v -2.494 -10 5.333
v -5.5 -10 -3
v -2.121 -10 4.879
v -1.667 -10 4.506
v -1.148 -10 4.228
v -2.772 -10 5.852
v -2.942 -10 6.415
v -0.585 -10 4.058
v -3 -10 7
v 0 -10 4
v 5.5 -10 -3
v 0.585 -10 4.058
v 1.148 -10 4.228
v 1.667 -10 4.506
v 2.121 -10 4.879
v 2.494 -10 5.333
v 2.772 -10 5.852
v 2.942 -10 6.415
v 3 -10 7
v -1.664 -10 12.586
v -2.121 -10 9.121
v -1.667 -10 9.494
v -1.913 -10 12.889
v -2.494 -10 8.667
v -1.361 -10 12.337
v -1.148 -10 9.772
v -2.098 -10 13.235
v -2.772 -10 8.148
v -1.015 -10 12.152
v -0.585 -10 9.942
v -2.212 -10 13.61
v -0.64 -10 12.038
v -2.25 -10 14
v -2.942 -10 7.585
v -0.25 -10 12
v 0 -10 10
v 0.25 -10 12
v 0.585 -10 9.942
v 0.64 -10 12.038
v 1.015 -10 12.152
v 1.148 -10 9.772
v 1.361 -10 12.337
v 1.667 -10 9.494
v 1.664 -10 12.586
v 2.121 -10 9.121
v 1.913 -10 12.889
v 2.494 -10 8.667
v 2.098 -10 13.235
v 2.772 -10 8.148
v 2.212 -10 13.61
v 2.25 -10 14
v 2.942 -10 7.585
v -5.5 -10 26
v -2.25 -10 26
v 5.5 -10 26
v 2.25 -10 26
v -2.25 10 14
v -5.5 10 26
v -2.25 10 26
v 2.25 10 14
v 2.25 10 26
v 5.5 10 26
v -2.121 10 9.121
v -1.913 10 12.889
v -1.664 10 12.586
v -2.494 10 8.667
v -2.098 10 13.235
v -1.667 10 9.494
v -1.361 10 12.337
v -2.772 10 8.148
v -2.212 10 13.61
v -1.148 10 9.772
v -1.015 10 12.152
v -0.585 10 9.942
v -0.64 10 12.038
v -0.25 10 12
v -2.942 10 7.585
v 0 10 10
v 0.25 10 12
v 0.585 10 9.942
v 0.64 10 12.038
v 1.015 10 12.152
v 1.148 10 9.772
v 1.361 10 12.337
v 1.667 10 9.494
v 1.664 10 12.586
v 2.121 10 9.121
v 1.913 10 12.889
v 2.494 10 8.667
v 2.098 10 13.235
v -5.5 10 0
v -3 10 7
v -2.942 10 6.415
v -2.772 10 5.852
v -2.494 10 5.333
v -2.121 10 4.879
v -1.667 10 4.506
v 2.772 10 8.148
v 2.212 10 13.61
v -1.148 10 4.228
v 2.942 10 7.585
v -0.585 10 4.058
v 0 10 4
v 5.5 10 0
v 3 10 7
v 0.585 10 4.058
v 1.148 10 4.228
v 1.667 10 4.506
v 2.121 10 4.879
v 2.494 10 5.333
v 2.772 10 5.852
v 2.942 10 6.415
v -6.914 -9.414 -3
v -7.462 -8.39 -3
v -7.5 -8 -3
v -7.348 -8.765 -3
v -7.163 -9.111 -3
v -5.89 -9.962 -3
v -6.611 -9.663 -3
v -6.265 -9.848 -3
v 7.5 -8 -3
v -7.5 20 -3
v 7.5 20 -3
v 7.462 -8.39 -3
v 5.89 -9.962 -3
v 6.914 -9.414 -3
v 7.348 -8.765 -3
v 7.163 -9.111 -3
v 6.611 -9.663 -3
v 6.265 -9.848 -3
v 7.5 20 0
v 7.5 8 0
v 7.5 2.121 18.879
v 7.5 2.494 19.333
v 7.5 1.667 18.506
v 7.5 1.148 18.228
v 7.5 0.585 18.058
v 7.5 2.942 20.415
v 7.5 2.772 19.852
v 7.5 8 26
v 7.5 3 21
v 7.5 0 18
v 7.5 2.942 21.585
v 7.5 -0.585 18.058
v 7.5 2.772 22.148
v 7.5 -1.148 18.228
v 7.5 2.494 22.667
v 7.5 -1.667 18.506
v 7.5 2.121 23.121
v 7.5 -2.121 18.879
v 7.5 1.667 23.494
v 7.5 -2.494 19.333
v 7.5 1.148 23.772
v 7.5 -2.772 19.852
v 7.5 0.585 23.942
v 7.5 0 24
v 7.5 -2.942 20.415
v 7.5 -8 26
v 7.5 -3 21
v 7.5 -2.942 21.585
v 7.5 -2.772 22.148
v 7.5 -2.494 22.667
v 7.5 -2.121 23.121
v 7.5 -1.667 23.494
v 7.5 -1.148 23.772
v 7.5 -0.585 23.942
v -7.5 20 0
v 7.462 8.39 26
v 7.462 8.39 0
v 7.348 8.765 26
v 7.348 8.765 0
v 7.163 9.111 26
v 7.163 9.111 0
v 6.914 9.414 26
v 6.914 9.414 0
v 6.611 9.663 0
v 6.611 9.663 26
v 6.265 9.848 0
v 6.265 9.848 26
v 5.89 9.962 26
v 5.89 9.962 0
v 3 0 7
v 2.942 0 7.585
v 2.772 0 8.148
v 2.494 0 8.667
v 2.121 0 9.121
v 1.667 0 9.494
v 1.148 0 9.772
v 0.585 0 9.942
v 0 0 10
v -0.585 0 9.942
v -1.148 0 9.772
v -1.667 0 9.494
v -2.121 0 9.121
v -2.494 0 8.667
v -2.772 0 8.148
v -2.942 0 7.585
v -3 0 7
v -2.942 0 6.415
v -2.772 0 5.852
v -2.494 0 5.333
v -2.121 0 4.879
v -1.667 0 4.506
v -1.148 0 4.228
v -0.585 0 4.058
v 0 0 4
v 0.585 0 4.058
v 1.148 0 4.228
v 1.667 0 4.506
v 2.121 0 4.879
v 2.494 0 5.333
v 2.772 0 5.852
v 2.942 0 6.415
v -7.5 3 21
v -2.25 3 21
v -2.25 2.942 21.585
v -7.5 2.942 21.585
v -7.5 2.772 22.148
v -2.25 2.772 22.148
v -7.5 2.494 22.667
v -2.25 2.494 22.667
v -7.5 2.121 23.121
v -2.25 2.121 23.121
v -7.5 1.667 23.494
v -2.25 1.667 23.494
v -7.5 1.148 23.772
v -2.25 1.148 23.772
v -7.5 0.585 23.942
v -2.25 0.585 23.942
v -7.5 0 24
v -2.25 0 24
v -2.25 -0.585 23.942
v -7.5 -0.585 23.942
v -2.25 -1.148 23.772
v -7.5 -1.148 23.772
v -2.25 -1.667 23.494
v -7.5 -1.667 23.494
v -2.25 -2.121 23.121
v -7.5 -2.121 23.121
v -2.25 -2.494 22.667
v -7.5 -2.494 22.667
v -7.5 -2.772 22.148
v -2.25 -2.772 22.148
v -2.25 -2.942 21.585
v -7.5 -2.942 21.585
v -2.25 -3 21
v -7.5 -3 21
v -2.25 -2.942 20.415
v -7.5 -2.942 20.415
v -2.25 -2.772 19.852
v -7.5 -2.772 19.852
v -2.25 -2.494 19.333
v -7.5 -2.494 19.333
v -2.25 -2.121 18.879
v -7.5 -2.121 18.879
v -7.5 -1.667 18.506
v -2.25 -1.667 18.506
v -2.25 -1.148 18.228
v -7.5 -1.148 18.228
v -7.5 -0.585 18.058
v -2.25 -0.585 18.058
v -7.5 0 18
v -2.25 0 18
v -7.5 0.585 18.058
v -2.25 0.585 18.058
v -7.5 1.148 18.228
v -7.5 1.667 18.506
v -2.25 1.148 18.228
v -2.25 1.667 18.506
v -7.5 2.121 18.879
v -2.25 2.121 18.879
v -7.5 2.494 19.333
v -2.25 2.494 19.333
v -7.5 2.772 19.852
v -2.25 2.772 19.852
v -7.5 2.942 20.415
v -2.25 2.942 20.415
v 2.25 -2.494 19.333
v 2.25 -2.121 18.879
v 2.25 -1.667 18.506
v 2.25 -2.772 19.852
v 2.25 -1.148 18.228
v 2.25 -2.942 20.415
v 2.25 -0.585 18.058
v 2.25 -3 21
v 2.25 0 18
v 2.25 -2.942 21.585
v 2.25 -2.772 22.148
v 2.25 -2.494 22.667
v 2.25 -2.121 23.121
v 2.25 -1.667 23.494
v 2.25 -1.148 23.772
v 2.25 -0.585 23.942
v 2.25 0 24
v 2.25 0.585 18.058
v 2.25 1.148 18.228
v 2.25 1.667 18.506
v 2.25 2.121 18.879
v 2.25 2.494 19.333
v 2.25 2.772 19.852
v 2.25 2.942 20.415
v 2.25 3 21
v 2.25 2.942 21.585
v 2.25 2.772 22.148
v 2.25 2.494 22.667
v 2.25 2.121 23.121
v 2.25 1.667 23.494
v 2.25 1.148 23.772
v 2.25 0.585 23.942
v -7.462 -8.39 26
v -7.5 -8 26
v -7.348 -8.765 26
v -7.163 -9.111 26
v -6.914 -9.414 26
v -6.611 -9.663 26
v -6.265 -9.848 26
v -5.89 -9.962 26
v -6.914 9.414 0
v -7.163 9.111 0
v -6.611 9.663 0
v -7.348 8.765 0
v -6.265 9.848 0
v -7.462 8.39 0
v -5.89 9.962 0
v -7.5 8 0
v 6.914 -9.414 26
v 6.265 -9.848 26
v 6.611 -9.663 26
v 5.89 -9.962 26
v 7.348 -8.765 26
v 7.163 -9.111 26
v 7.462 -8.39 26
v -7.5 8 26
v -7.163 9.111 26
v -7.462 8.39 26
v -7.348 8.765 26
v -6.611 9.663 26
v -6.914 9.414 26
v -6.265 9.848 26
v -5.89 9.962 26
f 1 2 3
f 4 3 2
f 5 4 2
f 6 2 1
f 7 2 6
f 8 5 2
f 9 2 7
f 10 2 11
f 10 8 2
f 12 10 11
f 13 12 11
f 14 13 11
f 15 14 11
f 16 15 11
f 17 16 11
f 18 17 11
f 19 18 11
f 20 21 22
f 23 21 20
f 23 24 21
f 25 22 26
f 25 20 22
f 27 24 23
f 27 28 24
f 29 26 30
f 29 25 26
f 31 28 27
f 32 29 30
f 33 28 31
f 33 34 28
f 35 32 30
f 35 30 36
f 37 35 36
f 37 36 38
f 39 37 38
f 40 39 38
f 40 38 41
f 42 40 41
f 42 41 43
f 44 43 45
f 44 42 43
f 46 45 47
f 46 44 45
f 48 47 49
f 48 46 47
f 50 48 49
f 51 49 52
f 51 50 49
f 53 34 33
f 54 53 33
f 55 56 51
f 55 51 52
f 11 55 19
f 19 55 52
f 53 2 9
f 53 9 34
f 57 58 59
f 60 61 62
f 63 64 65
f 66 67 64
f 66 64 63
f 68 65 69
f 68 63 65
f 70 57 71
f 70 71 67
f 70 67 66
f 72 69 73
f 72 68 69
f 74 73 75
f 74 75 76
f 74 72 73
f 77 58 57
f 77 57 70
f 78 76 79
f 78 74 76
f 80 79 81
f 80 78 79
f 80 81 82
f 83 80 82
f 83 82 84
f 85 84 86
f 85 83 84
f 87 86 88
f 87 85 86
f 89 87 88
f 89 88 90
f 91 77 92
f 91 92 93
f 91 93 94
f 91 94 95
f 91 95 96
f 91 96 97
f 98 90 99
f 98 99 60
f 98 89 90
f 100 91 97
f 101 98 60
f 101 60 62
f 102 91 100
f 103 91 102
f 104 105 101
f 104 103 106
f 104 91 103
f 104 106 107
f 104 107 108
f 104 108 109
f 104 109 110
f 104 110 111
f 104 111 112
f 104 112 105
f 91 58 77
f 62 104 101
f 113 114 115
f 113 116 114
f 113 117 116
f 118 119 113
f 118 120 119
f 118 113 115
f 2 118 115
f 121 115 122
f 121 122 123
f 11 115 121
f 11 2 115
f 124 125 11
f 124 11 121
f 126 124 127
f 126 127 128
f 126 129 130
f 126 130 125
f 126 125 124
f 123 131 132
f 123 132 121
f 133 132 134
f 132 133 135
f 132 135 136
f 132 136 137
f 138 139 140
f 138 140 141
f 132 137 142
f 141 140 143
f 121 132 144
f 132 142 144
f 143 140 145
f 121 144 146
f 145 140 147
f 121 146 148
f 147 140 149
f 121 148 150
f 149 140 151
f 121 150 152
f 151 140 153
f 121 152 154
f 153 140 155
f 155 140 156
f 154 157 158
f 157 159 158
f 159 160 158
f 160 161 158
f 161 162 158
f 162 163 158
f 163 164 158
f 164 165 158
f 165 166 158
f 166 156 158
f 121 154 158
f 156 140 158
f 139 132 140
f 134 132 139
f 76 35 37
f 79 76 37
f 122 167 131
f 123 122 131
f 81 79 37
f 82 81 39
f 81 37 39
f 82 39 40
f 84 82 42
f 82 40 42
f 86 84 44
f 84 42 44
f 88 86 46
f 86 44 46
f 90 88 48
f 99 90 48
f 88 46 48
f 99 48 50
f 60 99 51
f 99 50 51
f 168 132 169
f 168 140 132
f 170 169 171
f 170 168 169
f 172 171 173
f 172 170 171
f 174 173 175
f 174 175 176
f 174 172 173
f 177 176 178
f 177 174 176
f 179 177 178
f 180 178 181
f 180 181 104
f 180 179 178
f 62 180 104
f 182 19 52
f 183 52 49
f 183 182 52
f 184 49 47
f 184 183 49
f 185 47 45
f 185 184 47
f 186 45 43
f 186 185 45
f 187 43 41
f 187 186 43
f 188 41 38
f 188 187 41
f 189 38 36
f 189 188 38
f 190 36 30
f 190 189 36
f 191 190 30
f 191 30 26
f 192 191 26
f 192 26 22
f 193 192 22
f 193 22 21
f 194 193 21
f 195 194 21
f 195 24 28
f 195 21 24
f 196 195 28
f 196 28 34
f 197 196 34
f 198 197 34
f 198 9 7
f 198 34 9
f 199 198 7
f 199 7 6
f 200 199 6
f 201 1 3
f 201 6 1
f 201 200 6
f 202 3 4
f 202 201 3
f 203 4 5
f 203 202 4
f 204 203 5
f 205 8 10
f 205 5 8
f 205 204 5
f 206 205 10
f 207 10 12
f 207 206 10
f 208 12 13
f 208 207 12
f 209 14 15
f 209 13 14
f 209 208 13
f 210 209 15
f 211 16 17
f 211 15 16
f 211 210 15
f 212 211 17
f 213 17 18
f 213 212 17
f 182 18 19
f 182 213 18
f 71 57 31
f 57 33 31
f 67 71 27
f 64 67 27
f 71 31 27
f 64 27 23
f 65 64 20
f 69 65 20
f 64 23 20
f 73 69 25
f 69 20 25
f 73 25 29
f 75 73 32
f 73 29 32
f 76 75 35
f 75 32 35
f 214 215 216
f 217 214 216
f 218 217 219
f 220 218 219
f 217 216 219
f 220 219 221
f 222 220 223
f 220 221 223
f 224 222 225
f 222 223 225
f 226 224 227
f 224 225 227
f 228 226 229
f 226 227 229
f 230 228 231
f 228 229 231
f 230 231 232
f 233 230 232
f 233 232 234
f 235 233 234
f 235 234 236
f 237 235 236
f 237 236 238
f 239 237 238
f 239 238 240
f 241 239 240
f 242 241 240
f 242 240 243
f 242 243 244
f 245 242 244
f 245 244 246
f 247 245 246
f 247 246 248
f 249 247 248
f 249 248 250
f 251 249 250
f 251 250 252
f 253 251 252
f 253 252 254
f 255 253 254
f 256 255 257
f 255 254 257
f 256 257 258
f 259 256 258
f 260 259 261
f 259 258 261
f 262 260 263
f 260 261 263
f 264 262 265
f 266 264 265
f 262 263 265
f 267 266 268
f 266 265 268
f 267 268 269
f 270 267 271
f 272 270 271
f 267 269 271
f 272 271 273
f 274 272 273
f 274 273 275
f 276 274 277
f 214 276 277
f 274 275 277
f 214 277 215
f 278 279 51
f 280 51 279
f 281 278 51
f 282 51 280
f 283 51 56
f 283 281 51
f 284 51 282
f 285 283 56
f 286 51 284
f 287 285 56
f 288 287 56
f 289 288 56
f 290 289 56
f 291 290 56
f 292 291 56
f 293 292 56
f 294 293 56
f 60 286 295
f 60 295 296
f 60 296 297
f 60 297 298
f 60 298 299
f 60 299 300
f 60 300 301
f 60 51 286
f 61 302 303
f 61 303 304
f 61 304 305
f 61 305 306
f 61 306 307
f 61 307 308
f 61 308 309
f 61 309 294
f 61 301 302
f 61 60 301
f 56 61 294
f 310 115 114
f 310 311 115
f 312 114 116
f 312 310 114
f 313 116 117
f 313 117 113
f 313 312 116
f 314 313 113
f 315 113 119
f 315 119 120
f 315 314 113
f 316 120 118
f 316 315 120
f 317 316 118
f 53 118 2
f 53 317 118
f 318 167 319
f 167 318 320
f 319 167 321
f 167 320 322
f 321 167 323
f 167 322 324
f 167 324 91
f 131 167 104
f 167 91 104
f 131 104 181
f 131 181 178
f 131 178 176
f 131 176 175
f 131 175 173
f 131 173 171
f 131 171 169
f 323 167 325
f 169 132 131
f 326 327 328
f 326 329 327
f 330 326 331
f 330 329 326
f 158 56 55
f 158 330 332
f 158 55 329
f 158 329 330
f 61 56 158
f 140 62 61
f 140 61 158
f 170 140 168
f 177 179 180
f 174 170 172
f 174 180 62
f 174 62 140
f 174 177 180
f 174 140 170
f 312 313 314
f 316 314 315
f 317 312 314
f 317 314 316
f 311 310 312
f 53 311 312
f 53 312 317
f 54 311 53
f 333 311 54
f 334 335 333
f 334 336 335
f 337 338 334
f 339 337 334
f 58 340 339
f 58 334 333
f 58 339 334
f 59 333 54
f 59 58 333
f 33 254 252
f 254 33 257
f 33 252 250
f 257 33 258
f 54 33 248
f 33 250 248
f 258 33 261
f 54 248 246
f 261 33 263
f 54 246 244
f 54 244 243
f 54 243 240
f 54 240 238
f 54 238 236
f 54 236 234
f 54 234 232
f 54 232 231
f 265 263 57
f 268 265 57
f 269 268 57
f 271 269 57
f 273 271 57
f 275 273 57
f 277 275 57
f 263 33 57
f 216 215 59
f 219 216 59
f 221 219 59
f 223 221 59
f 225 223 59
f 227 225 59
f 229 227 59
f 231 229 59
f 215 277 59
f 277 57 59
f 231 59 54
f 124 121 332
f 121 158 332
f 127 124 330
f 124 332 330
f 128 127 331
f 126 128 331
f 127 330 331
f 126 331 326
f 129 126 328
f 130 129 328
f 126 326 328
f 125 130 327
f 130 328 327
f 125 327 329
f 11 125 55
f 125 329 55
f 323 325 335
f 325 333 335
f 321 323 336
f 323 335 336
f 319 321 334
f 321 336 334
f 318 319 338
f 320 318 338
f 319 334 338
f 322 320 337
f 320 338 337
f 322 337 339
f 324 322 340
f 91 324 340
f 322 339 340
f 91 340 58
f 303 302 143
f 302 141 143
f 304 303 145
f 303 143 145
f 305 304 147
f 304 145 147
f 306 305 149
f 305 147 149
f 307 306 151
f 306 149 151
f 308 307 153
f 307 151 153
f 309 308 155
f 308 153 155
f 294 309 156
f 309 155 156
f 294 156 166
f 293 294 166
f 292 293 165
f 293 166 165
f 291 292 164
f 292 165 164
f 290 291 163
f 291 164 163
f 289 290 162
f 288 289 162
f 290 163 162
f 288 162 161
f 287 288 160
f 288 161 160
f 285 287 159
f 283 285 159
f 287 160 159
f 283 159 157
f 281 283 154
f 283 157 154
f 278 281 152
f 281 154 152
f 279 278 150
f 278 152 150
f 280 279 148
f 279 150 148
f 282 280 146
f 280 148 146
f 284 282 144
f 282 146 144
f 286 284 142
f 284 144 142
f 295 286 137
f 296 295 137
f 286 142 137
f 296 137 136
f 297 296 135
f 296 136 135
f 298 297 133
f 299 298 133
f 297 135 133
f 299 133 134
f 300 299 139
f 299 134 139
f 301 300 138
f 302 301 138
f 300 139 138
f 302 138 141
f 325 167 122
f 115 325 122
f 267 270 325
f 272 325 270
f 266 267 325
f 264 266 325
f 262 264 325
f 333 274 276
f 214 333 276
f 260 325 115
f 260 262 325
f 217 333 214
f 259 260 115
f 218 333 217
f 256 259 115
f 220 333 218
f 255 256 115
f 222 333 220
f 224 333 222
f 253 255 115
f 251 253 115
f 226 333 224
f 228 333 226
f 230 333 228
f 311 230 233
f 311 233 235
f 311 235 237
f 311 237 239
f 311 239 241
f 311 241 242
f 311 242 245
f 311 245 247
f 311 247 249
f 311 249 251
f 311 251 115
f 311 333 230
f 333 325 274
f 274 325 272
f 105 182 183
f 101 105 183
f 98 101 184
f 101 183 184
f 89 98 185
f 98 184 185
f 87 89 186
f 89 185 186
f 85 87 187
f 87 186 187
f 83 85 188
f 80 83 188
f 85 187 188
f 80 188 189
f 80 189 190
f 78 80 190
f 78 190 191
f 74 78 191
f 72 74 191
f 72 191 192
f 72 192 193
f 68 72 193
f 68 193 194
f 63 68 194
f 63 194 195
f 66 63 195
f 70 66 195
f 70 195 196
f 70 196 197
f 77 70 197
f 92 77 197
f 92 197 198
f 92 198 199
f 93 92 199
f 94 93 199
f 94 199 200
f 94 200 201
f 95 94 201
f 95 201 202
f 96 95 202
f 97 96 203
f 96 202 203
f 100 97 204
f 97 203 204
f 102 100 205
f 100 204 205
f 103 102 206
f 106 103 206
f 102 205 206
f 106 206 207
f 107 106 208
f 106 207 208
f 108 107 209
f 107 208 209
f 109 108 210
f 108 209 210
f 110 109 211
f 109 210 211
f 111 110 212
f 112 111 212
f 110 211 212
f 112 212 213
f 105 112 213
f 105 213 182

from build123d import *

# Parameters (mm, degrees)
F0_W          = 15
F0_H          = 20
F1_DEPTH      = 26
F2_R          = 3
F3_DEPTH      = 10.001
F3_DEPTH_BACK = 10.001
F4_R          = 3
F5_DEPTH      = 7.501
F5_DEPTH_BACK = 7.501
F6_W          = 4.5
F6_H          = 14
F7_DEPTH      = 10.001
F7_DEPTH_BACK = 10.001
F8_W          = 15
F8_H          = 30
F9_DEPTH      = 3
F10_R         = 2


# Not quite as in the source:
# - two fillets or chamfers of one size are made in one step
# - a feature names something its author has since deleted; it is built from what else it names


with BuildPart() as f1:
    # F0 (on Top) → F1 (new body)
    with BuildSketch(Plane.XY):
        Rectangle(F0_W, F0_H)
    extrude(amount=F1_DEPTH)

    # F2 (on Front) → F3 (cut, two sides)
    with BuildSketch(Plane.XZ) as f3_sk:
        with Locations((0, 7)):
            Circle(F2_R)
    extrude(amount=-F3_DEPTH, mode=Mode.SUBTRACT)
    extrude(f3_sk.sketch, amount=F3_DEPTH_BACK, mode=Mode.SUBTRACT)

    # F4 (on Right) → F5 (cut, two sides)
    with BuildSketch(Plane.YZ) as f5_sk:
        with Locations((0, 21)):
            Circle(F4_R)
    extrude(amount=-F5_DEPTH, mode=Mode.SUBTRACT)
    extrude(f5_sk.sketch, amount=F5_DEPTH_BACK, mode=Mode.SUBTRACT)

    # F6 (on Front) → F7 (cut, two sides)
    with BuildSketch(Plane.XZ) as f7_sk:
        with Locations((0, 19)):
            Rectangle(F6_W, F6_H)
    extrude(amount=-F7_DEPTH, mode=Mode.SUBTRACT)
    extrude(f7_sk.sketch, amount=F7_DEPTH_BACK, mode=Mode.SUBTRACT)

    # F8 (on face) → F9 (join)
    with BuildSketch(Plane(origin=(0, 0, 0), x_dir=(1, 0, 0), z_dir=(0, 0, -1))):
        with Locations((0, -5)):
            Rectangle(F8_W, F8_H)
    extrude(amount=F9_DEPTH)

    # F10
    f10_edges = [f1.edges().sort_by_distance(p)[0] for p in [
        (7.5, -10, 11.5),
        (-7.5, -10, 11.5),
        (-7.5, 10, 13),
        (7.5, 10, 13),
        (2.25, 0, 12),
        (-2.25, 0, 12),
    ]]
    fillet(f10_edges, radius=F10_R)


solid = f1.part
